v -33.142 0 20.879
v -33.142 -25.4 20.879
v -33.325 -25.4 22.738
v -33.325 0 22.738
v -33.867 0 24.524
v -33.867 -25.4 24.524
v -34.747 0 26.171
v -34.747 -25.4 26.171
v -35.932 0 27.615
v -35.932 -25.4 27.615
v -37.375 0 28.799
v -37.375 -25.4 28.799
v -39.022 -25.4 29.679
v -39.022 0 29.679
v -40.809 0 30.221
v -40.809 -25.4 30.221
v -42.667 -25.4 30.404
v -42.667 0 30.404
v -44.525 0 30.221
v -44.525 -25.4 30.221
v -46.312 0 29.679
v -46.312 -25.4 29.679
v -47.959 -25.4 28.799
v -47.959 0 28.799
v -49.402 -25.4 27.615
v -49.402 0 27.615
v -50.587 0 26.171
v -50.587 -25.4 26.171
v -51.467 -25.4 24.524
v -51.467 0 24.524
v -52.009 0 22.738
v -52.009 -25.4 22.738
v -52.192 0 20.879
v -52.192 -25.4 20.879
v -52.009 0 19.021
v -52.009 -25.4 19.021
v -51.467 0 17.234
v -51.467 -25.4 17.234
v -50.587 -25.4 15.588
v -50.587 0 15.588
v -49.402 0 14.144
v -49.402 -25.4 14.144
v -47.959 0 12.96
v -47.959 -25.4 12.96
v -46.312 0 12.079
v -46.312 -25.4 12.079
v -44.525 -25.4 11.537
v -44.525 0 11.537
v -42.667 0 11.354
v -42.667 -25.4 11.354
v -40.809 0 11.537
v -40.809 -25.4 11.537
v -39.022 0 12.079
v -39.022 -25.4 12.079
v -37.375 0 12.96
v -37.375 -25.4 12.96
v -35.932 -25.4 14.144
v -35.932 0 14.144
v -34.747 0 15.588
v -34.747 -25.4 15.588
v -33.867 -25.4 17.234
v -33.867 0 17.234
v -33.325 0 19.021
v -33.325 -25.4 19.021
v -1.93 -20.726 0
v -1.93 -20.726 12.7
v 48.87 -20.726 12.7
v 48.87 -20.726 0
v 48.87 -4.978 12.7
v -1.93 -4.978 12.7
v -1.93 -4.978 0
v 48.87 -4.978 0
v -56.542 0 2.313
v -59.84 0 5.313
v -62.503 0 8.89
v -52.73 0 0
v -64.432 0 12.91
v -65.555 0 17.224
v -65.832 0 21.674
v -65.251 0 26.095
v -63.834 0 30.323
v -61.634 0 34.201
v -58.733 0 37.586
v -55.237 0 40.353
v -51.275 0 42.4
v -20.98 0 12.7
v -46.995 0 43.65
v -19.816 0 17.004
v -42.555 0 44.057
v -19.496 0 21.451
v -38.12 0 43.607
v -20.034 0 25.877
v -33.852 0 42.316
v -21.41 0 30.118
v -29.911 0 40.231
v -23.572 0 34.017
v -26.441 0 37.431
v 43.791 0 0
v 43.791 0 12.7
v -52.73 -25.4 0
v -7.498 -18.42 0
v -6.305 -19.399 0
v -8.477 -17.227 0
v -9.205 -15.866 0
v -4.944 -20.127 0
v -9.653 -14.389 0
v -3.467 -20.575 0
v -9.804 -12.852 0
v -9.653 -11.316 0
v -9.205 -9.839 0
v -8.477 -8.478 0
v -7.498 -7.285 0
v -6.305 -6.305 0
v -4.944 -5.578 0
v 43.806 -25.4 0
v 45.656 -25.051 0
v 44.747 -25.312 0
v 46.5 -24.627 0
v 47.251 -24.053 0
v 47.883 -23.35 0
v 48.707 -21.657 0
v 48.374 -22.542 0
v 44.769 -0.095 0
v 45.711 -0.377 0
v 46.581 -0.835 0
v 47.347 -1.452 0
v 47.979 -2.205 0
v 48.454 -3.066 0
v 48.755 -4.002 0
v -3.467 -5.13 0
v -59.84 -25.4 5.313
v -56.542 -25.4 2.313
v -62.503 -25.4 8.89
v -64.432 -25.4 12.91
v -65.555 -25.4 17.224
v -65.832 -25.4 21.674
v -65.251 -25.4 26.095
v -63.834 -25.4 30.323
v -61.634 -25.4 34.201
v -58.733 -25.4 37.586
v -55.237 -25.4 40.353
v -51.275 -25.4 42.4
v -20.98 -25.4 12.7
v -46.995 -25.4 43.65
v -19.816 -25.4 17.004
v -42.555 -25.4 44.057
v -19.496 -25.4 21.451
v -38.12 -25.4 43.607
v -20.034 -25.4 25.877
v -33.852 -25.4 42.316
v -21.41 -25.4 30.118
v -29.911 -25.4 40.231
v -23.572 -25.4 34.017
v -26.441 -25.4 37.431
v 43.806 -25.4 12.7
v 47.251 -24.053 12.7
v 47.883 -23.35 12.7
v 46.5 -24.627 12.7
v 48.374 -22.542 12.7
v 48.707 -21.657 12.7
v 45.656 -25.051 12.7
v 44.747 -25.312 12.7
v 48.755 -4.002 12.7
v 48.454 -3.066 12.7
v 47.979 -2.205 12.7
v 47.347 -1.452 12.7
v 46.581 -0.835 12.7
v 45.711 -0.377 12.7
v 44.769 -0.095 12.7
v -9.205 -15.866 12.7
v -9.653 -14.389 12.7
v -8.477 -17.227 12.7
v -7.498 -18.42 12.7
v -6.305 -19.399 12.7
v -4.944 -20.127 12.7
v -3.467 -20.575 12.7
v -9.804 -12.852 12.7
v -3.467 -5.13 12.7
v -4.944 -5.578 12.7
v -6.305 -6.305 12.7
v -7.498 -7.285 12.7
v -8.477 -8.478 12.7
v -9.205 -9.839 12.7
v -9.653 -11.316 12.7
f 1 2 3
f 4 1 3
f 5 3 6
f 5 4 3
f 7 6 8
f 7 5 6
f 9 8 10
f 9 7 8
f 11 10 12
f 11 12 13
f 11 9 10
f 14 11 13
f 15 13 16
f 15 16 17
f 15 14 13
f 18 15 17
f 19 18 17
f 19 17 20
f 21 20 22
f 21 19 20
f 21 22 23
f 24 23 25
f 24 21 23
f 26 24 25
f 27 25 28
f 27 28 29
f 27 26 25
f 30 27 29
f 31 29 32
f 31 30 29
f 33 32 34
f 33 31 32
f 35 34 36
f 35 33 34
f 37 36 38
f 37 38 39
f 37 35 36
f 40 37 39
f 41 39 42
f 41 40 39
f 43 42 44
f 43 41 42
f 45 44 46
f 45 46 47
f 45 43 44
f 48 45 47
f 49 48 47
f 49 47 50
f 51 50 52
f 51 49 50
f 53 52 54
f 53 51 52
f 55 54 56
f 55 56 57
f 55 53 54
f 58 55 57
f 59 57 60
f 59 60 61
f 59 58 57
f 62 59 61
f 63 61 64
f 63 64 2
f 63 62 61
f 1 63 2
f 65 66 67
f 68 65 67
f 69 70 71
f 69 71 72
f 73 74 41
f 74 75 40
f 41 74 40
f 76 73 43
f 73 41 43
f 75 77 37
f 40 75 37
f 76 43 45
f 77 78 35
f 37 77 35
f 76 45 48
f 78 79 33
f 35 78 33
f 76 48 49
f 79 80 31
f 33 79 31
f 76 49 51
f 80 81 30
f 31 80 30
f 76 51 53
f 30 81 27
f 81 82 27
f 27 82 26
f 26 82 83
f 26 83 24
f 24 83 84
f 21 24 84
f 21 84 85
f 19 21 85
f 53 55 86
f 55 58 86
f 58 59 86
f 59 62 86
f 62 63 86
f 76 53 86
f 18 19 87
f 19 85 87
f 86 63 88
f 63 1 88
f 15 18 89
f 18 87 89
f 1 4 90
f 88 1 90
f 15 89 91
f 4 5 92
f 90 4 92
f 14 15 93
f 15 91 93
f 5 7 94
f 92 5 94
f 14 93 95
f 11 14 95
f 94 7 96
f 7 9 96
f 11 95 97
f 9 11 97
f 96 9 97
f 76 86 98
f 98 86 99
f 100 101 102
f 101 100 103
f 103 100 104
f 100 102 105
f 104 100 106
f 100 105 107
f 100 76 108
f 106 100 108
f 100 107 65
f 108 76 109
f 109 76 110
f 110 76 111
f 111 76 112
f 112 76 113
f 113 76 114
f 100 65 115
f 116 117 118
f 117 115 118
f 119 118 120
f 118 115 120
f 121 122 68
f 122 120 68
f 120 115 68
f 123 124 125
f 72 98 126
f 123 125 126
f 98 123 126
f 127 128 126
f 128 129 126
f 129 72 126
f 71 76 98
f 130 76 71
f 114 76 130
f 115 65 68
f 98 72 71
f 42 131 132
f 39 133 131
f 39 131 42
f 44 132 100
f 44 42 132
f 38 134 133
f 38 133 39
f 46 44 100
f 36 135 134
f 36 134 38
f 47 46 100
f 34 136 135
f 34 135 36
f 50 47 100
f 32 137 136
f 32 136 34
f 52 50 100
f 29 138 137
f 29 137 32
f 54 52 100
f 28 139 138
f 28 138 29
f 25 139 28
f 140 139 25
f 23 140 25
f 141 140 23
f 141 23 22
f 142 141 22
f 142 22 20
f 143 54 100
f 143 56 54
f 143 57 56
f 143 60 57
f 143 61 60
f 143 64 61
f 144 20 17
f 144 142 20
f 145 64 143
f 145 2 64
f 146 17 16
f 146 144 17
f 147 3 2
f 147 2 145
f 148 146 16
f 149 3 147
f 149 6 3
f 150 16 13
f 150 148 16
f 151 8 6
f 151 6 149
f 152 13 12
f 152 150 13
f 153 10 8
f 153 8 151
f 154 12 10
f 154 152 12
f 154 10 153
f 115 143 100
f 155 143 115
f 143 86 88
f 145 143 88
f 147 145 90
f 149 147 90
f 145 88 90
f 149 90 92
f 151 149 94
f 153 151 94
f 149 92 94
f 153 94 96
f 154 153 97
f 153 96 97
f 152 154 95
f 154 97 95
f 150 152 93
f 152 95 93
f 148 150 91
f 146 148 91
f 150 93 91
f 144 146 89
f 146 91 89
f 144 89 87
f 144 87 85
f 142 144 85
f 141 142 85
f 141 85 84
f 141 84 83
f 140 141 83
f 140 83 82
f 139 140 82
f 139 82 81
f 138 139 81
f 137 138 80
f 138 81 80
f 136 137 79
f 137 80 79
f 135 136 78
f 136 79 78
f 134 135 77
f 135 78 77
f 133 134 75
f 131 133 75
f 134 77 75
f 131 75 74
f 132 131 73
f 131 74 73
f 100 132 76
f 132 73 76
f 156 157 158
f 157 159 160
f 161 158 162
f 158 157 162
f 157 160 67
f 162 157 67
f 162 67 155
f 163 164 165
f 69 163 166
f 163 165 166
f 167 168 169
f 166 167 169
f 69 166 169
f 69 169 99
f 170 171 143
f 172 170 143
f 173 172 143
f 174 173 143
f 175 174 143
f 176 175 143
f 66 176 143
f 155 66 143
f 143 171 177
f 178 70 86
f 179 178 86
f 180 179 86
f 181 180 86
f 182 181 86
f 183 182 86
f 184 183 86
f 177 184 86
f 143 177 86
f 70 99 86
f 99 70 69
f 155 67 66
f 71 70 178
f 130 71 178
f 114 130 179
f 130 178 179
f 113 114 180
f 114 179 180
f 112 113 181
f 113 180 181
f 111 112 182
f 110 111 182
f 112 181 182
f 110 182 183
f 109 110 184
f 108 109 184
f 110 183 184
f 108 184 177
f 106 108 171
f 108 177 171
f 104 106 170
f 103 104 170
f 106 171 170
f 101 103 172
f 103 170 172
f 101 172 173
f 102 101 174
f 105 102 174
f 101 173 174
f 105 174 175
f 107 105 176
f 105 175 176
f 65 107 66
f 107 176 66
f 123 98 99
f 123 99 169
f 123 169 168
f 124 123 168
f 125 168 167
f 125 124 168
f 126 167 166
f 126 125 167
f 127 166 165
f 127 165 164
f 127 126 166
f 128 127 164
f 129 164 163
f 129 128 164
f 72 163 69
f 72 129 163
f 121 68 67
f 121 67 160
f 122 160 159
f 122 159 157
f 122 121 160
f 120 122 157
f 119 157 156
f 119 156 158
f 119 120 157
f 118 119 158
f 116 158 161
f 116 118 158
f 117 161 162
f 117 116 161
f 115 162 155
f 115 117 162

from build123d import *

# Parameters (mm, degrees)
F0_R        = 9.525
F2_DEPTH    = 25.4
F3_W        = 50.8
F3_H        = 15.748
F4_DEPTH    = 25.4
F5_T1_DEPTH = 38.0949194415
F5_T3_DEPTH = 38.0185897363


# Not quite as in the source:
# - a fillet or chamfer that OpenCascade refuses, or shapes differently, is made with other operations: its cross-section is extruded or revolved along the edge and cut away or added


with BuildPart() as f2:
    # F0 (on Front) → F2 (new body)
    with BuildSketch(Plane.XZ):
        with BuildLine():
            ThreePointArc((-20.9804001153, 12.7), (-51.2752635033, 42.3996584702), (-52.7304001153, 0))
            Line((-52.7304001153, 0), (48.8695998847, 0))
            Line((48.8695998847, 0), (48.8695998847, 12.7))
            Line((48.8695998847, 12.7), (-20.9804001153, 12.7))
        make_face()
        with Locations((-42.6671736259, 20.8794337765)):
            Circle(F0_R, mode=Mode.SUBTRACT)
    extrude(amount=F2_DEPTH)

    # F3 (on face) → F4 (cut)
    with BuildSketch(Plane.XY.offset(12.7)):
        with Locations((23.4695998847, -12.8523994962)):
            Rectangle(F3_W, F3_H)
        with BuildLine():
            ThreePointArc((-1.9304001153, -4.9783994962), (-9.8044001153, -12.8523994962), (-1.9304001153, -20.7263994962))
            Line((-1.9304001153, -20.7263994962), (-1.9304001153, -4.9783994962))
        make_face()
    extrude(amount=-F4_DEPTH, mode=Mode.SUBTRACT)

    # F5: fillet of radius 5.08 on 2 edges, made by hand

    # F5_s2 → F5_t1 (cut)
    with BuildSketch(Plane.XY.offset(-12.6974597208)):
        with BuildLine():
            ThreePointArc((43.7906159964, 0), (47.3466158165, -1.4521541819), (48.8695998847, -4.9783994962))
            Line((48.8695998847, -4.9783994962), (48.8695998847, 0))
            Line((48.8695998847, 0), (43.7906159964, 0))
        make_face()
    extrude(amount=F5_T1_DEPTH, mode=Mode.SUBTRACT)

    # F5_s4 → F5_t3 (cut)
    with BuildSketch(Plane.XY.offset(-12.6592948682)):
        with BuildLine():
            ThreePointArc((48.8695998847, -20.7263994962), (47.2513057546, -24.0530221966), (43.8058819375, -25.4))
            Line((43.8058819375, -25.4), (48.8695998847, -25.4))
            Line((48.8695998847, -25.4), (48.8695998847, -20.7263994962))
        make_face()
    extrude(amount=F5_T3_DEPTH, mode=Mode.SUBTRACT)


solid = f2.part
